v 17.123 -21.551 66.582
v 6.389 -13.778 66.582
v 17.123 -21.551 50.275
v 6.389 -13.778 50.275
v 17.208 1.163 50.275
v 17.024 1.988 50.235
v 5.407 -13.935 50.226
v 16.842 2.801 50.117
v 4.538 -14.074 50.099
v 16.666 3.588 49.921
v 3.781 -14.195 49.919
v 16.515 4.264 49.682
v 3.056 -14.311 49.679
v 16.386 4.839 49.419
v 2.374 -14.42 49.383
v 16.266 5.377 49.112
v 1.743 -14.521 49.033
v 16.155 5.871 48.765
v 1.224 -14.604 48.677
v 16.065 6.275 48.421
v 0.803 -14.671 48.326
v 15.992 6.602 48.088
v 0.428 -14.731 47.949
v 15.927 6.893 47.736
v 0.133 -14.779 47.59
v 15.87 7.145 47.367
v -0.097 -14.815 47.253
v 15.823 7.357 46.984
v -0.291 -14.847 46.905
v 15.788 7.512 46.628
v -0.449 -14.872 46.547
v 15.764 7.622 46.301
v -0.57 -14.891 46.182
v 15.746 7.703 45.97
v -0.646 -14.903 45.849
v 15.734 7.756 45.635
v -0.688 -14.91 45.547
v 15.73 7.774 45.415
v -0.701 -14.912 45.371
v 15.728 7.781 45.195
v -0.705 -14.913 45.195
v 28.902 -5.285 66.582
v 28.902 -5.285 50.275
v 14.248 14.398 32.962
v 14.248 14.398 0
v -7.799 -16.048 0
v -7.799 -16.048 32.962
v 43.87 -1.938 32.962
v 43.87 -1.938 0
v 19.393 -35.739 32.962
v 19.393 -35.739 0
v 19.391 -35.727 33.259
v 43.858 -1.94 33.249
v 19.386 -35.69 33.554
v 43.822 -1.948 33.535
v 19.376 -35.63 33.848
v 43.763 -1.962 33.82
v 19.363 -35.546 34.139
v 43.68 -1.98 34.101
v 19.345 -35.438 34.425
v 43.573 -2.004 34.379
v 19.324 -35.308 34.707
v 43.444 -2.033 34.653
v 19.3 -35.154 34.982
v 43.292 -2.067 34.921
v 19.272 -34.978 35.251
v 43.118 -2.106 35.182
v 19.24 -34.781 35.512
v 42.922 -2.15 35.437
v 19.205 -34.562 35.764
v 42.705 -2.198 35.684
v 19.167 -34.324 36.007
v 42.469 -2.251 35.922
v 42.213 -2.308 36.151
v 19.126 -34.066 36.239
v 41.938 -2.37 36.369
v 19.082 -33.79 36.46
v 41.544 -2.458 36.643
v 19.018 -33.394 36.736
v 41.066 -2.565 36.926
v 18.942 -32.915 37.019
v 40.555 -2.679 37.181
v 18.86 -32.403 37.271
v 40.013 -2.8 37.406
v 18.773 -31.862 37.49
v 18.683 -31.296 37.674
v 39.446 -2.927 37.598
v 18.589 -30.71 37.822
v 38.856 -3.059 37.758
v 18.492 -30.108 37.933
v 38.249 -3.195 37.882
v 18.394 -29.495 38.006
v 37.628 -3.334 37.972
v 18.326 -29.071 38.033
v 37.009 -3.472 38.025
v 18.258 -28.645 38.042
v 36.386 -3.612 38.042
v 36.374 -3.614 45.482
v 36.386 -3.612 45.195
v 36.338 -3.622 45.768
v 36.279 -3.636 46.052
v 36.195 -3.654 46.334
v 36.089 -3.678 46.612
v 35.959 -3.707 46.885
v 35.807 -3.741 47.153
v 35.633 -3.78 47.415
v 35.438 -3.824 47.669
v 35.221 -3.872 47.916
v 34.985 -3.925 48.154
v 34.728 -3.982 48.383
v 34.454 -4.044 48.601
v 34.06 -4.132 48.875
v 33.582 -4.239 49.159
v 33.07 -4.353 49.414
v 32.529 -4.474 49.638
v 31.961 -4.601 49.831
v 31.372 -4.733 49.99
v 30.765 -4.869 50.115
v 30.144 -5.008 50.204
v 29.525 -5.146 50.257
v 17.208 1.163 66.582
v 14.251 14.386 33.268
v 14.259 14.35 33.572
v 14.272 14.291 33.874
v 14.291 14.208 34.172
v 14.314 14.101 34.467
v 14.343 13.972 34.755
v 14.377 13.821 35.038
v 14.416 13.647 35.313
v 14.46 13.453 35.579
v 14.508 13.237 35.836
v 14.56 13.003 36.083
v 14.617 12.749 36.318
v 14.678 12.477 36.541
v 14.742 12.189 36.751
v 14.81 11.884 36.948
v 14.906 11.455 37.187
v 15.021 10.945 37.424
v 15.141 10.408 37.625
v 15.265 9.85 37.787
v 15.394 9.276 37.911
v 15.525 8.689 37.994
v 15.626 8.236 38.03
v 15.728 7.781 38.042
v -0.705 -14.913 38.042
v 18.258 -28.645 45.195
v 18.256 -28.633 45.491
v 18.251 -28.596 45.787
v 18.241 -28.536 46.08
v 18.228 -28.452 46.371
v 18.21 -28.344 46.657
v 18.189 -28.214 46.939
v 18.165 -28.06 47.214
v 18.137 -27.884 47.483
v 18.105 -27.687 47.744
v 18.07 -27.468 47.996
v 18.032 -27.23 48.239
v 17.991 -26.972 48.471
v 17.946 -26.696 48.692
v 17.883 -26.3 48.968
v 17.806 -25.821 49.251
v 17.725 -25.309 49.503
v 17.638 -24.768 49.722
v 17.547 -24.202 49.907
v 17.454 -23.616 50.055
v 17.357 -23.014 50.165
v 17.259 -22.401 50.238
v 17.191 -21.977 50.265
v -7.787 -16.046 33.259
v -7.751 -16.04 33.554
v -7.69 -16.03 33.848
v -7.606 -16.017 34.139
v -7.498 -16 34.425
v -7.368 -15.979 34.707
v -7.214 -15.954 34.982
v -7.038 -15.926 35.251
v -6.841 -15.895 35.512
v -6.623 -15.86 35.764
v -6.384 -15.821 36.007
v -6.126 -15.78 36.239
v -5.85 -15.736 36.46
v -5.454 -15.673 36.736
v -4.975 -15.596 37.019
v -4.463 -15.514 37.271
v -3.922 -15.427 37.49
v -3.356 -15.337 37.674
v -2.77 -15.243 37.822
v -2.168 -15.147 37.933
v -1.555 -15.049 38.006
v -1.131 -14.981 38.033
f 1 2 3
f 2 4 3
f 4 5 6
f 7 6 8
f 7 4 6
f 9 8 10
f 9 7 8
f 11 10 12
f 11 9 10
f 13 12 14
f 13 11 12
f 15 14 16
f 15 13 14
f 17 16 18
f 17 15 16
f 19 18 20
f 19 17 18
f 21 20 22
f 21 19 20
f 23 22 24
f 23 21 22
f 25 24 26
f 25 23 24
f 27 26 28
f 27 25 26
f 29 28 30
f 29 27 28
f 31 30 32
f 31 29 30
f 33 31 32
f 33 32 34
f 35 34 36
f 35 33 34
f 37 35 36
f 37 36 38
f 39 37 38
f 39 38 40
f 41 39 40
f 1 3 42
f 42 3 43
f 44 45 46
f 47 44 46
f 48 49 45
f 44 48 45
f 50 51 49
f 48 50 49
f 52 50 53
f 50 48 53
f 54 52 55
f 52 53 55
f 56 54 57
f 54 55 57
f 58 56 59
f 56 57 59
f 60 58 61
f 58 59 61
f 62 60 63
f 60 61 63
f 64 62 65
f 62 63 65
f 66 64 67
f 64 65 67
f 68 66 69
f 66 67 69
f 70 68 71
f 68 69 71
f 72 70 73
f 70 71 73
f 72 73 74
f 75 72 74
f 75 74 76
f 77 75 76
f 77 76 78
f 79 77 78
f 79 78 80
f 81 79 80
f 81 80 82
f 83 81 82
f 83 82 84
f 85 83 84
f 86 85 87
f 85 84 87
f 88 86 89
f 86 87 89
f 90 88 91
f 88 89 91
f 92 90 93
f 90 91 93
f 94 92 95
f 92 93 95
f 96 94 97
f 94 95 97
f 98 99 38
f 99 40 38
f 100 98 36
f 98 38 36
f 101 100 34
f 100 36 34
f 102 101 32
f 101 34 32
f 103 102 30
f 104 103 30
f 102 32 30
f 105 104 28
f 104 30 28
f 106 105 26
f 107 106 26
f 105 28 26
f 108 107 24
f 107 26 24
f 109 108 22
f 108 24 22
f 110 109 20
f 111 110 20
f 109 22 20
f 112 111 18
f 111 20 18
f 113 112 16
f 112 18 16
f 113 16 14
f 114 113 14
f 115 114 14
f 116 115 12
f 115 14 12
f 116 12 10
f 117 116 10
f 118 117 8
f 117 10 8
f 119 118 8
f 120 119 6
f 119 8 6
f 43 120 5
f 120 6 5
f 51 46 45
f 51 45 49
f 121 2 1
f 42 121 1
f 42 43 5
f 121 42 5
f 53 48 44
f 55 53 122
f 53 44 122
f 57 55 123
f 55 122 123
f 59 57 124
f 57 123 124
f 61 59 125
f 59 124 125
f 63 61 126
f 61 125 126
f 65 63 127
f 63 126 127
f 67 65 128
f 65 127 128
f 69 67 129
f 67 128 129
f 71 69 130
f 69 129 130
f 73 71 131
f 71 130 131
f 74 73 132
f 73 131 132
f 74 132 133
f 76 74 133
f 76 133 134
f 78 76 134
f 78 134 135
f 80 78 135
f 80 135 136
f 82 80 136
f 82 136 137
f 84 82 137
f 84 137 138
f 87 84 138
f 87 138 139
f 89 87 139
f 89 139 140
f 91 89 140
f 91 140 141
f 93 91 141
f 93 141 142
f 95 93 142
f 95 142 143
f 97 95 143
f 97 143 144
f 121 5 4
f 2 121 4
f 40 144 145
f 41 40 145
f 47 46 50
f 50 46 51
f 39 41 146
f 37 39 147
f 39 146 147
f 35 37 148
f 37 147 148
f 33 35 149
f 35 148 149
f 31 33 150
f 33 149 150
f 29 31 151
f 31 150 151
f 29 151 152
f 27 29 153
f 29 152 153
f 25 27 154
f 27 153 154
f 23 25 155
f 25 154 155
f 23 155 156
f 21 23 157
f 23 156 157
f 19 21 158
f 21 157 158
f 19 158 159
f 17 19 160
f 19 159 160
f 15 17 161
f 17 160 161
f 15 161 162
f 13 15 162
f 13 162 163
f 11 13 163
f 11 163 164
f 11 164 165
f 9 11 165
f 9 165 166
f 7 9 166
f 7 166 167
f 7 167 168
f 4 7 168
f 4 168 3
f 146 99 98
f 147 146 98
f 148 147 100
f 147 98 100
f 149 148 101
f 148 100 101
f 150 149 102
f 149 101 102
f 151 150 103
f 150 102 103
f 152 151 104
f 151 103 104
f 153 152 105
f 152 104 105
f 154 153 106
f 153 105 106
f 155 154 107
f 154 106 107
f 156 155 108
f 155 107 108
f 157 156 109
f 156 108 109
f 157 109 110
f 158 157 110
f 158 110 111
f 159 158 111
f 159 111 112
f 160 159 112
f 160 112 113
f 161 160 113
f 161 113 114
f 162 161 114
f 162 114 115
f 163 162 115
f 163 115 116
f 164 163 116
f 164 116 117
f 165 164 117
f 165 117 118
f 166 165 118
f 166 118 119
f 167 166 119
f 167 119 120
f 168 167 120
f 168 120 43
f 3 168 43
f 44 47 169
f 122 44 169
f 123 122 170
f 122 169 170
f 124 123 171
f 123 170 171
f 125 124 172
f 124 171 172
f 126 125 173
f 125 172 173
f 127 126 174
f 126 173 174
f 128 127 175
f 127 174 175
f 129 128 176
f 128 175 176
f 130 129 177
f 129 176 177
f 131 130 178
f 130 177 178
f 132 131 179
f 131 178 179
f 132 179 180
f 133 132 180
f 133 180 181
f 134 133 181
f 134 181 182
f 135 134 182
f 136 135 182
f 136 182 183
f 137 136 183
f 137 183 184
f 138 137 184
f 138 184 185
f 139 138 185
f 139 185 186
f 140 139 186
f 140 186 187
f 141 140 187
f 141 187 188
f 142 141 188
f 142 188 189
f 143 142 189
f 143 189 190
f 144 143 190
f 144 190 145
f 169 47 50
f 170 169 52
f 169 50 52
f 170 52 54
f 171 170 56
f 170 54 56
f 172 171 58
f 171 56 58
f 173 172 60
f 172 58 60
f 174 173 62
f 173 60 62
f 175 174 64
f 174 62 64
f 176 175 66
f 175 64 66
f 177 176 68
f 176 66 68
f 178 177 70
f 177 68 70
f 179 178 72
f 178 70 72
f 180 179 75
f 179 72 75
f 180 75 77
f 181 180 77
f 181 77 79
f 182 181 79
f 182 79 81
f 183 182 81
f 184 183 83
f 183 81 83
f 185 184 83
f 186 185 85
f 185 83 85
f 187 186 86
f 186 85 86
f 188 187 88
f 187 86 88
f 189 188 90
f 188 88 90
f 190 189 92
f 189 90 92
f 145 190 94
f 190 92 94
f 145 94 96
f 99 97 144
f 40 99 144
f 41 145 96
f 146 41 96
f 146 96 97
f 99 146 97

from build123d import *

# Parameters (mm, degrees)
F1_DEPTH = 38.0422770977
F2_R     = 5.08
F3_DEPTH = 12.232337147
F4_R     = 5.08
F5_DEPTH = 7.3413159698
F6_DEPTH = 8.9663118124


with BuildPart() as f1:
    # F0 (on Top) → F1 (new body)
    with BuildSketch(Plane.XY):
        Polygon((43.8701745906, -1.9375651716), (14.2481029034, 14.3980756402), (-7.7989399433, -16.04783535), (19.3933885201, -35.7388352654), align=None)
    extrude(amount=F1_DEPTH)

    # F2
    f2_edges = [f1.edges().sort_by_distance(p)[0] for p in [
        (31.631782, -18.8382, 38.042277),
        (29.059139, 6.230255, 38.042277),
        (3.224581, -0.82488, 38.042277),
        (5.797224, -25.893335, 38.042277),
    ]]
    fillet(f2_edges, radius=F2_R)

    # F3 (add): a face of the model
    f3_faces = [f1.faces().sort_by_distance(p)[0] for p in [
        (17.578761895, -9.9497918988, 38.0422770977),
    ]]
    extrude(f3_faces, amount=F3_DEPTH)

    # F4
    f4_edges = [f1.edges().sort_by_distance(p)[0] for p in [
        (7.511612, -3.566101, 50.274614),
        (8.776694, -21.77883, 50.274614),
        (27.322154, -16.128185, 50.274614),
        (26.057072, 2.084544, 50.274614),
    ]]
    fillet(f4_edges, radius=F4_R)

    # F5 (add): a face of the model
    f5_faces = [f1.faces().sort_by_distance(p)[0] for p in [
        (17.4849129571, -9.9130484235, 50.2746142447),
    ]]
    extrude(f5_faces, amount=F5_DEPTH)

    # F6 (add): a face of the model
    f6_faces = [f1.faces().sort_by_distance(p)[0] for p in [
        (17.4849129571, -9.9130484235, 57.6159302145),
    ]]
    extrude(f6_faces, amount=F6_DEPTH)


solid = f1.part
